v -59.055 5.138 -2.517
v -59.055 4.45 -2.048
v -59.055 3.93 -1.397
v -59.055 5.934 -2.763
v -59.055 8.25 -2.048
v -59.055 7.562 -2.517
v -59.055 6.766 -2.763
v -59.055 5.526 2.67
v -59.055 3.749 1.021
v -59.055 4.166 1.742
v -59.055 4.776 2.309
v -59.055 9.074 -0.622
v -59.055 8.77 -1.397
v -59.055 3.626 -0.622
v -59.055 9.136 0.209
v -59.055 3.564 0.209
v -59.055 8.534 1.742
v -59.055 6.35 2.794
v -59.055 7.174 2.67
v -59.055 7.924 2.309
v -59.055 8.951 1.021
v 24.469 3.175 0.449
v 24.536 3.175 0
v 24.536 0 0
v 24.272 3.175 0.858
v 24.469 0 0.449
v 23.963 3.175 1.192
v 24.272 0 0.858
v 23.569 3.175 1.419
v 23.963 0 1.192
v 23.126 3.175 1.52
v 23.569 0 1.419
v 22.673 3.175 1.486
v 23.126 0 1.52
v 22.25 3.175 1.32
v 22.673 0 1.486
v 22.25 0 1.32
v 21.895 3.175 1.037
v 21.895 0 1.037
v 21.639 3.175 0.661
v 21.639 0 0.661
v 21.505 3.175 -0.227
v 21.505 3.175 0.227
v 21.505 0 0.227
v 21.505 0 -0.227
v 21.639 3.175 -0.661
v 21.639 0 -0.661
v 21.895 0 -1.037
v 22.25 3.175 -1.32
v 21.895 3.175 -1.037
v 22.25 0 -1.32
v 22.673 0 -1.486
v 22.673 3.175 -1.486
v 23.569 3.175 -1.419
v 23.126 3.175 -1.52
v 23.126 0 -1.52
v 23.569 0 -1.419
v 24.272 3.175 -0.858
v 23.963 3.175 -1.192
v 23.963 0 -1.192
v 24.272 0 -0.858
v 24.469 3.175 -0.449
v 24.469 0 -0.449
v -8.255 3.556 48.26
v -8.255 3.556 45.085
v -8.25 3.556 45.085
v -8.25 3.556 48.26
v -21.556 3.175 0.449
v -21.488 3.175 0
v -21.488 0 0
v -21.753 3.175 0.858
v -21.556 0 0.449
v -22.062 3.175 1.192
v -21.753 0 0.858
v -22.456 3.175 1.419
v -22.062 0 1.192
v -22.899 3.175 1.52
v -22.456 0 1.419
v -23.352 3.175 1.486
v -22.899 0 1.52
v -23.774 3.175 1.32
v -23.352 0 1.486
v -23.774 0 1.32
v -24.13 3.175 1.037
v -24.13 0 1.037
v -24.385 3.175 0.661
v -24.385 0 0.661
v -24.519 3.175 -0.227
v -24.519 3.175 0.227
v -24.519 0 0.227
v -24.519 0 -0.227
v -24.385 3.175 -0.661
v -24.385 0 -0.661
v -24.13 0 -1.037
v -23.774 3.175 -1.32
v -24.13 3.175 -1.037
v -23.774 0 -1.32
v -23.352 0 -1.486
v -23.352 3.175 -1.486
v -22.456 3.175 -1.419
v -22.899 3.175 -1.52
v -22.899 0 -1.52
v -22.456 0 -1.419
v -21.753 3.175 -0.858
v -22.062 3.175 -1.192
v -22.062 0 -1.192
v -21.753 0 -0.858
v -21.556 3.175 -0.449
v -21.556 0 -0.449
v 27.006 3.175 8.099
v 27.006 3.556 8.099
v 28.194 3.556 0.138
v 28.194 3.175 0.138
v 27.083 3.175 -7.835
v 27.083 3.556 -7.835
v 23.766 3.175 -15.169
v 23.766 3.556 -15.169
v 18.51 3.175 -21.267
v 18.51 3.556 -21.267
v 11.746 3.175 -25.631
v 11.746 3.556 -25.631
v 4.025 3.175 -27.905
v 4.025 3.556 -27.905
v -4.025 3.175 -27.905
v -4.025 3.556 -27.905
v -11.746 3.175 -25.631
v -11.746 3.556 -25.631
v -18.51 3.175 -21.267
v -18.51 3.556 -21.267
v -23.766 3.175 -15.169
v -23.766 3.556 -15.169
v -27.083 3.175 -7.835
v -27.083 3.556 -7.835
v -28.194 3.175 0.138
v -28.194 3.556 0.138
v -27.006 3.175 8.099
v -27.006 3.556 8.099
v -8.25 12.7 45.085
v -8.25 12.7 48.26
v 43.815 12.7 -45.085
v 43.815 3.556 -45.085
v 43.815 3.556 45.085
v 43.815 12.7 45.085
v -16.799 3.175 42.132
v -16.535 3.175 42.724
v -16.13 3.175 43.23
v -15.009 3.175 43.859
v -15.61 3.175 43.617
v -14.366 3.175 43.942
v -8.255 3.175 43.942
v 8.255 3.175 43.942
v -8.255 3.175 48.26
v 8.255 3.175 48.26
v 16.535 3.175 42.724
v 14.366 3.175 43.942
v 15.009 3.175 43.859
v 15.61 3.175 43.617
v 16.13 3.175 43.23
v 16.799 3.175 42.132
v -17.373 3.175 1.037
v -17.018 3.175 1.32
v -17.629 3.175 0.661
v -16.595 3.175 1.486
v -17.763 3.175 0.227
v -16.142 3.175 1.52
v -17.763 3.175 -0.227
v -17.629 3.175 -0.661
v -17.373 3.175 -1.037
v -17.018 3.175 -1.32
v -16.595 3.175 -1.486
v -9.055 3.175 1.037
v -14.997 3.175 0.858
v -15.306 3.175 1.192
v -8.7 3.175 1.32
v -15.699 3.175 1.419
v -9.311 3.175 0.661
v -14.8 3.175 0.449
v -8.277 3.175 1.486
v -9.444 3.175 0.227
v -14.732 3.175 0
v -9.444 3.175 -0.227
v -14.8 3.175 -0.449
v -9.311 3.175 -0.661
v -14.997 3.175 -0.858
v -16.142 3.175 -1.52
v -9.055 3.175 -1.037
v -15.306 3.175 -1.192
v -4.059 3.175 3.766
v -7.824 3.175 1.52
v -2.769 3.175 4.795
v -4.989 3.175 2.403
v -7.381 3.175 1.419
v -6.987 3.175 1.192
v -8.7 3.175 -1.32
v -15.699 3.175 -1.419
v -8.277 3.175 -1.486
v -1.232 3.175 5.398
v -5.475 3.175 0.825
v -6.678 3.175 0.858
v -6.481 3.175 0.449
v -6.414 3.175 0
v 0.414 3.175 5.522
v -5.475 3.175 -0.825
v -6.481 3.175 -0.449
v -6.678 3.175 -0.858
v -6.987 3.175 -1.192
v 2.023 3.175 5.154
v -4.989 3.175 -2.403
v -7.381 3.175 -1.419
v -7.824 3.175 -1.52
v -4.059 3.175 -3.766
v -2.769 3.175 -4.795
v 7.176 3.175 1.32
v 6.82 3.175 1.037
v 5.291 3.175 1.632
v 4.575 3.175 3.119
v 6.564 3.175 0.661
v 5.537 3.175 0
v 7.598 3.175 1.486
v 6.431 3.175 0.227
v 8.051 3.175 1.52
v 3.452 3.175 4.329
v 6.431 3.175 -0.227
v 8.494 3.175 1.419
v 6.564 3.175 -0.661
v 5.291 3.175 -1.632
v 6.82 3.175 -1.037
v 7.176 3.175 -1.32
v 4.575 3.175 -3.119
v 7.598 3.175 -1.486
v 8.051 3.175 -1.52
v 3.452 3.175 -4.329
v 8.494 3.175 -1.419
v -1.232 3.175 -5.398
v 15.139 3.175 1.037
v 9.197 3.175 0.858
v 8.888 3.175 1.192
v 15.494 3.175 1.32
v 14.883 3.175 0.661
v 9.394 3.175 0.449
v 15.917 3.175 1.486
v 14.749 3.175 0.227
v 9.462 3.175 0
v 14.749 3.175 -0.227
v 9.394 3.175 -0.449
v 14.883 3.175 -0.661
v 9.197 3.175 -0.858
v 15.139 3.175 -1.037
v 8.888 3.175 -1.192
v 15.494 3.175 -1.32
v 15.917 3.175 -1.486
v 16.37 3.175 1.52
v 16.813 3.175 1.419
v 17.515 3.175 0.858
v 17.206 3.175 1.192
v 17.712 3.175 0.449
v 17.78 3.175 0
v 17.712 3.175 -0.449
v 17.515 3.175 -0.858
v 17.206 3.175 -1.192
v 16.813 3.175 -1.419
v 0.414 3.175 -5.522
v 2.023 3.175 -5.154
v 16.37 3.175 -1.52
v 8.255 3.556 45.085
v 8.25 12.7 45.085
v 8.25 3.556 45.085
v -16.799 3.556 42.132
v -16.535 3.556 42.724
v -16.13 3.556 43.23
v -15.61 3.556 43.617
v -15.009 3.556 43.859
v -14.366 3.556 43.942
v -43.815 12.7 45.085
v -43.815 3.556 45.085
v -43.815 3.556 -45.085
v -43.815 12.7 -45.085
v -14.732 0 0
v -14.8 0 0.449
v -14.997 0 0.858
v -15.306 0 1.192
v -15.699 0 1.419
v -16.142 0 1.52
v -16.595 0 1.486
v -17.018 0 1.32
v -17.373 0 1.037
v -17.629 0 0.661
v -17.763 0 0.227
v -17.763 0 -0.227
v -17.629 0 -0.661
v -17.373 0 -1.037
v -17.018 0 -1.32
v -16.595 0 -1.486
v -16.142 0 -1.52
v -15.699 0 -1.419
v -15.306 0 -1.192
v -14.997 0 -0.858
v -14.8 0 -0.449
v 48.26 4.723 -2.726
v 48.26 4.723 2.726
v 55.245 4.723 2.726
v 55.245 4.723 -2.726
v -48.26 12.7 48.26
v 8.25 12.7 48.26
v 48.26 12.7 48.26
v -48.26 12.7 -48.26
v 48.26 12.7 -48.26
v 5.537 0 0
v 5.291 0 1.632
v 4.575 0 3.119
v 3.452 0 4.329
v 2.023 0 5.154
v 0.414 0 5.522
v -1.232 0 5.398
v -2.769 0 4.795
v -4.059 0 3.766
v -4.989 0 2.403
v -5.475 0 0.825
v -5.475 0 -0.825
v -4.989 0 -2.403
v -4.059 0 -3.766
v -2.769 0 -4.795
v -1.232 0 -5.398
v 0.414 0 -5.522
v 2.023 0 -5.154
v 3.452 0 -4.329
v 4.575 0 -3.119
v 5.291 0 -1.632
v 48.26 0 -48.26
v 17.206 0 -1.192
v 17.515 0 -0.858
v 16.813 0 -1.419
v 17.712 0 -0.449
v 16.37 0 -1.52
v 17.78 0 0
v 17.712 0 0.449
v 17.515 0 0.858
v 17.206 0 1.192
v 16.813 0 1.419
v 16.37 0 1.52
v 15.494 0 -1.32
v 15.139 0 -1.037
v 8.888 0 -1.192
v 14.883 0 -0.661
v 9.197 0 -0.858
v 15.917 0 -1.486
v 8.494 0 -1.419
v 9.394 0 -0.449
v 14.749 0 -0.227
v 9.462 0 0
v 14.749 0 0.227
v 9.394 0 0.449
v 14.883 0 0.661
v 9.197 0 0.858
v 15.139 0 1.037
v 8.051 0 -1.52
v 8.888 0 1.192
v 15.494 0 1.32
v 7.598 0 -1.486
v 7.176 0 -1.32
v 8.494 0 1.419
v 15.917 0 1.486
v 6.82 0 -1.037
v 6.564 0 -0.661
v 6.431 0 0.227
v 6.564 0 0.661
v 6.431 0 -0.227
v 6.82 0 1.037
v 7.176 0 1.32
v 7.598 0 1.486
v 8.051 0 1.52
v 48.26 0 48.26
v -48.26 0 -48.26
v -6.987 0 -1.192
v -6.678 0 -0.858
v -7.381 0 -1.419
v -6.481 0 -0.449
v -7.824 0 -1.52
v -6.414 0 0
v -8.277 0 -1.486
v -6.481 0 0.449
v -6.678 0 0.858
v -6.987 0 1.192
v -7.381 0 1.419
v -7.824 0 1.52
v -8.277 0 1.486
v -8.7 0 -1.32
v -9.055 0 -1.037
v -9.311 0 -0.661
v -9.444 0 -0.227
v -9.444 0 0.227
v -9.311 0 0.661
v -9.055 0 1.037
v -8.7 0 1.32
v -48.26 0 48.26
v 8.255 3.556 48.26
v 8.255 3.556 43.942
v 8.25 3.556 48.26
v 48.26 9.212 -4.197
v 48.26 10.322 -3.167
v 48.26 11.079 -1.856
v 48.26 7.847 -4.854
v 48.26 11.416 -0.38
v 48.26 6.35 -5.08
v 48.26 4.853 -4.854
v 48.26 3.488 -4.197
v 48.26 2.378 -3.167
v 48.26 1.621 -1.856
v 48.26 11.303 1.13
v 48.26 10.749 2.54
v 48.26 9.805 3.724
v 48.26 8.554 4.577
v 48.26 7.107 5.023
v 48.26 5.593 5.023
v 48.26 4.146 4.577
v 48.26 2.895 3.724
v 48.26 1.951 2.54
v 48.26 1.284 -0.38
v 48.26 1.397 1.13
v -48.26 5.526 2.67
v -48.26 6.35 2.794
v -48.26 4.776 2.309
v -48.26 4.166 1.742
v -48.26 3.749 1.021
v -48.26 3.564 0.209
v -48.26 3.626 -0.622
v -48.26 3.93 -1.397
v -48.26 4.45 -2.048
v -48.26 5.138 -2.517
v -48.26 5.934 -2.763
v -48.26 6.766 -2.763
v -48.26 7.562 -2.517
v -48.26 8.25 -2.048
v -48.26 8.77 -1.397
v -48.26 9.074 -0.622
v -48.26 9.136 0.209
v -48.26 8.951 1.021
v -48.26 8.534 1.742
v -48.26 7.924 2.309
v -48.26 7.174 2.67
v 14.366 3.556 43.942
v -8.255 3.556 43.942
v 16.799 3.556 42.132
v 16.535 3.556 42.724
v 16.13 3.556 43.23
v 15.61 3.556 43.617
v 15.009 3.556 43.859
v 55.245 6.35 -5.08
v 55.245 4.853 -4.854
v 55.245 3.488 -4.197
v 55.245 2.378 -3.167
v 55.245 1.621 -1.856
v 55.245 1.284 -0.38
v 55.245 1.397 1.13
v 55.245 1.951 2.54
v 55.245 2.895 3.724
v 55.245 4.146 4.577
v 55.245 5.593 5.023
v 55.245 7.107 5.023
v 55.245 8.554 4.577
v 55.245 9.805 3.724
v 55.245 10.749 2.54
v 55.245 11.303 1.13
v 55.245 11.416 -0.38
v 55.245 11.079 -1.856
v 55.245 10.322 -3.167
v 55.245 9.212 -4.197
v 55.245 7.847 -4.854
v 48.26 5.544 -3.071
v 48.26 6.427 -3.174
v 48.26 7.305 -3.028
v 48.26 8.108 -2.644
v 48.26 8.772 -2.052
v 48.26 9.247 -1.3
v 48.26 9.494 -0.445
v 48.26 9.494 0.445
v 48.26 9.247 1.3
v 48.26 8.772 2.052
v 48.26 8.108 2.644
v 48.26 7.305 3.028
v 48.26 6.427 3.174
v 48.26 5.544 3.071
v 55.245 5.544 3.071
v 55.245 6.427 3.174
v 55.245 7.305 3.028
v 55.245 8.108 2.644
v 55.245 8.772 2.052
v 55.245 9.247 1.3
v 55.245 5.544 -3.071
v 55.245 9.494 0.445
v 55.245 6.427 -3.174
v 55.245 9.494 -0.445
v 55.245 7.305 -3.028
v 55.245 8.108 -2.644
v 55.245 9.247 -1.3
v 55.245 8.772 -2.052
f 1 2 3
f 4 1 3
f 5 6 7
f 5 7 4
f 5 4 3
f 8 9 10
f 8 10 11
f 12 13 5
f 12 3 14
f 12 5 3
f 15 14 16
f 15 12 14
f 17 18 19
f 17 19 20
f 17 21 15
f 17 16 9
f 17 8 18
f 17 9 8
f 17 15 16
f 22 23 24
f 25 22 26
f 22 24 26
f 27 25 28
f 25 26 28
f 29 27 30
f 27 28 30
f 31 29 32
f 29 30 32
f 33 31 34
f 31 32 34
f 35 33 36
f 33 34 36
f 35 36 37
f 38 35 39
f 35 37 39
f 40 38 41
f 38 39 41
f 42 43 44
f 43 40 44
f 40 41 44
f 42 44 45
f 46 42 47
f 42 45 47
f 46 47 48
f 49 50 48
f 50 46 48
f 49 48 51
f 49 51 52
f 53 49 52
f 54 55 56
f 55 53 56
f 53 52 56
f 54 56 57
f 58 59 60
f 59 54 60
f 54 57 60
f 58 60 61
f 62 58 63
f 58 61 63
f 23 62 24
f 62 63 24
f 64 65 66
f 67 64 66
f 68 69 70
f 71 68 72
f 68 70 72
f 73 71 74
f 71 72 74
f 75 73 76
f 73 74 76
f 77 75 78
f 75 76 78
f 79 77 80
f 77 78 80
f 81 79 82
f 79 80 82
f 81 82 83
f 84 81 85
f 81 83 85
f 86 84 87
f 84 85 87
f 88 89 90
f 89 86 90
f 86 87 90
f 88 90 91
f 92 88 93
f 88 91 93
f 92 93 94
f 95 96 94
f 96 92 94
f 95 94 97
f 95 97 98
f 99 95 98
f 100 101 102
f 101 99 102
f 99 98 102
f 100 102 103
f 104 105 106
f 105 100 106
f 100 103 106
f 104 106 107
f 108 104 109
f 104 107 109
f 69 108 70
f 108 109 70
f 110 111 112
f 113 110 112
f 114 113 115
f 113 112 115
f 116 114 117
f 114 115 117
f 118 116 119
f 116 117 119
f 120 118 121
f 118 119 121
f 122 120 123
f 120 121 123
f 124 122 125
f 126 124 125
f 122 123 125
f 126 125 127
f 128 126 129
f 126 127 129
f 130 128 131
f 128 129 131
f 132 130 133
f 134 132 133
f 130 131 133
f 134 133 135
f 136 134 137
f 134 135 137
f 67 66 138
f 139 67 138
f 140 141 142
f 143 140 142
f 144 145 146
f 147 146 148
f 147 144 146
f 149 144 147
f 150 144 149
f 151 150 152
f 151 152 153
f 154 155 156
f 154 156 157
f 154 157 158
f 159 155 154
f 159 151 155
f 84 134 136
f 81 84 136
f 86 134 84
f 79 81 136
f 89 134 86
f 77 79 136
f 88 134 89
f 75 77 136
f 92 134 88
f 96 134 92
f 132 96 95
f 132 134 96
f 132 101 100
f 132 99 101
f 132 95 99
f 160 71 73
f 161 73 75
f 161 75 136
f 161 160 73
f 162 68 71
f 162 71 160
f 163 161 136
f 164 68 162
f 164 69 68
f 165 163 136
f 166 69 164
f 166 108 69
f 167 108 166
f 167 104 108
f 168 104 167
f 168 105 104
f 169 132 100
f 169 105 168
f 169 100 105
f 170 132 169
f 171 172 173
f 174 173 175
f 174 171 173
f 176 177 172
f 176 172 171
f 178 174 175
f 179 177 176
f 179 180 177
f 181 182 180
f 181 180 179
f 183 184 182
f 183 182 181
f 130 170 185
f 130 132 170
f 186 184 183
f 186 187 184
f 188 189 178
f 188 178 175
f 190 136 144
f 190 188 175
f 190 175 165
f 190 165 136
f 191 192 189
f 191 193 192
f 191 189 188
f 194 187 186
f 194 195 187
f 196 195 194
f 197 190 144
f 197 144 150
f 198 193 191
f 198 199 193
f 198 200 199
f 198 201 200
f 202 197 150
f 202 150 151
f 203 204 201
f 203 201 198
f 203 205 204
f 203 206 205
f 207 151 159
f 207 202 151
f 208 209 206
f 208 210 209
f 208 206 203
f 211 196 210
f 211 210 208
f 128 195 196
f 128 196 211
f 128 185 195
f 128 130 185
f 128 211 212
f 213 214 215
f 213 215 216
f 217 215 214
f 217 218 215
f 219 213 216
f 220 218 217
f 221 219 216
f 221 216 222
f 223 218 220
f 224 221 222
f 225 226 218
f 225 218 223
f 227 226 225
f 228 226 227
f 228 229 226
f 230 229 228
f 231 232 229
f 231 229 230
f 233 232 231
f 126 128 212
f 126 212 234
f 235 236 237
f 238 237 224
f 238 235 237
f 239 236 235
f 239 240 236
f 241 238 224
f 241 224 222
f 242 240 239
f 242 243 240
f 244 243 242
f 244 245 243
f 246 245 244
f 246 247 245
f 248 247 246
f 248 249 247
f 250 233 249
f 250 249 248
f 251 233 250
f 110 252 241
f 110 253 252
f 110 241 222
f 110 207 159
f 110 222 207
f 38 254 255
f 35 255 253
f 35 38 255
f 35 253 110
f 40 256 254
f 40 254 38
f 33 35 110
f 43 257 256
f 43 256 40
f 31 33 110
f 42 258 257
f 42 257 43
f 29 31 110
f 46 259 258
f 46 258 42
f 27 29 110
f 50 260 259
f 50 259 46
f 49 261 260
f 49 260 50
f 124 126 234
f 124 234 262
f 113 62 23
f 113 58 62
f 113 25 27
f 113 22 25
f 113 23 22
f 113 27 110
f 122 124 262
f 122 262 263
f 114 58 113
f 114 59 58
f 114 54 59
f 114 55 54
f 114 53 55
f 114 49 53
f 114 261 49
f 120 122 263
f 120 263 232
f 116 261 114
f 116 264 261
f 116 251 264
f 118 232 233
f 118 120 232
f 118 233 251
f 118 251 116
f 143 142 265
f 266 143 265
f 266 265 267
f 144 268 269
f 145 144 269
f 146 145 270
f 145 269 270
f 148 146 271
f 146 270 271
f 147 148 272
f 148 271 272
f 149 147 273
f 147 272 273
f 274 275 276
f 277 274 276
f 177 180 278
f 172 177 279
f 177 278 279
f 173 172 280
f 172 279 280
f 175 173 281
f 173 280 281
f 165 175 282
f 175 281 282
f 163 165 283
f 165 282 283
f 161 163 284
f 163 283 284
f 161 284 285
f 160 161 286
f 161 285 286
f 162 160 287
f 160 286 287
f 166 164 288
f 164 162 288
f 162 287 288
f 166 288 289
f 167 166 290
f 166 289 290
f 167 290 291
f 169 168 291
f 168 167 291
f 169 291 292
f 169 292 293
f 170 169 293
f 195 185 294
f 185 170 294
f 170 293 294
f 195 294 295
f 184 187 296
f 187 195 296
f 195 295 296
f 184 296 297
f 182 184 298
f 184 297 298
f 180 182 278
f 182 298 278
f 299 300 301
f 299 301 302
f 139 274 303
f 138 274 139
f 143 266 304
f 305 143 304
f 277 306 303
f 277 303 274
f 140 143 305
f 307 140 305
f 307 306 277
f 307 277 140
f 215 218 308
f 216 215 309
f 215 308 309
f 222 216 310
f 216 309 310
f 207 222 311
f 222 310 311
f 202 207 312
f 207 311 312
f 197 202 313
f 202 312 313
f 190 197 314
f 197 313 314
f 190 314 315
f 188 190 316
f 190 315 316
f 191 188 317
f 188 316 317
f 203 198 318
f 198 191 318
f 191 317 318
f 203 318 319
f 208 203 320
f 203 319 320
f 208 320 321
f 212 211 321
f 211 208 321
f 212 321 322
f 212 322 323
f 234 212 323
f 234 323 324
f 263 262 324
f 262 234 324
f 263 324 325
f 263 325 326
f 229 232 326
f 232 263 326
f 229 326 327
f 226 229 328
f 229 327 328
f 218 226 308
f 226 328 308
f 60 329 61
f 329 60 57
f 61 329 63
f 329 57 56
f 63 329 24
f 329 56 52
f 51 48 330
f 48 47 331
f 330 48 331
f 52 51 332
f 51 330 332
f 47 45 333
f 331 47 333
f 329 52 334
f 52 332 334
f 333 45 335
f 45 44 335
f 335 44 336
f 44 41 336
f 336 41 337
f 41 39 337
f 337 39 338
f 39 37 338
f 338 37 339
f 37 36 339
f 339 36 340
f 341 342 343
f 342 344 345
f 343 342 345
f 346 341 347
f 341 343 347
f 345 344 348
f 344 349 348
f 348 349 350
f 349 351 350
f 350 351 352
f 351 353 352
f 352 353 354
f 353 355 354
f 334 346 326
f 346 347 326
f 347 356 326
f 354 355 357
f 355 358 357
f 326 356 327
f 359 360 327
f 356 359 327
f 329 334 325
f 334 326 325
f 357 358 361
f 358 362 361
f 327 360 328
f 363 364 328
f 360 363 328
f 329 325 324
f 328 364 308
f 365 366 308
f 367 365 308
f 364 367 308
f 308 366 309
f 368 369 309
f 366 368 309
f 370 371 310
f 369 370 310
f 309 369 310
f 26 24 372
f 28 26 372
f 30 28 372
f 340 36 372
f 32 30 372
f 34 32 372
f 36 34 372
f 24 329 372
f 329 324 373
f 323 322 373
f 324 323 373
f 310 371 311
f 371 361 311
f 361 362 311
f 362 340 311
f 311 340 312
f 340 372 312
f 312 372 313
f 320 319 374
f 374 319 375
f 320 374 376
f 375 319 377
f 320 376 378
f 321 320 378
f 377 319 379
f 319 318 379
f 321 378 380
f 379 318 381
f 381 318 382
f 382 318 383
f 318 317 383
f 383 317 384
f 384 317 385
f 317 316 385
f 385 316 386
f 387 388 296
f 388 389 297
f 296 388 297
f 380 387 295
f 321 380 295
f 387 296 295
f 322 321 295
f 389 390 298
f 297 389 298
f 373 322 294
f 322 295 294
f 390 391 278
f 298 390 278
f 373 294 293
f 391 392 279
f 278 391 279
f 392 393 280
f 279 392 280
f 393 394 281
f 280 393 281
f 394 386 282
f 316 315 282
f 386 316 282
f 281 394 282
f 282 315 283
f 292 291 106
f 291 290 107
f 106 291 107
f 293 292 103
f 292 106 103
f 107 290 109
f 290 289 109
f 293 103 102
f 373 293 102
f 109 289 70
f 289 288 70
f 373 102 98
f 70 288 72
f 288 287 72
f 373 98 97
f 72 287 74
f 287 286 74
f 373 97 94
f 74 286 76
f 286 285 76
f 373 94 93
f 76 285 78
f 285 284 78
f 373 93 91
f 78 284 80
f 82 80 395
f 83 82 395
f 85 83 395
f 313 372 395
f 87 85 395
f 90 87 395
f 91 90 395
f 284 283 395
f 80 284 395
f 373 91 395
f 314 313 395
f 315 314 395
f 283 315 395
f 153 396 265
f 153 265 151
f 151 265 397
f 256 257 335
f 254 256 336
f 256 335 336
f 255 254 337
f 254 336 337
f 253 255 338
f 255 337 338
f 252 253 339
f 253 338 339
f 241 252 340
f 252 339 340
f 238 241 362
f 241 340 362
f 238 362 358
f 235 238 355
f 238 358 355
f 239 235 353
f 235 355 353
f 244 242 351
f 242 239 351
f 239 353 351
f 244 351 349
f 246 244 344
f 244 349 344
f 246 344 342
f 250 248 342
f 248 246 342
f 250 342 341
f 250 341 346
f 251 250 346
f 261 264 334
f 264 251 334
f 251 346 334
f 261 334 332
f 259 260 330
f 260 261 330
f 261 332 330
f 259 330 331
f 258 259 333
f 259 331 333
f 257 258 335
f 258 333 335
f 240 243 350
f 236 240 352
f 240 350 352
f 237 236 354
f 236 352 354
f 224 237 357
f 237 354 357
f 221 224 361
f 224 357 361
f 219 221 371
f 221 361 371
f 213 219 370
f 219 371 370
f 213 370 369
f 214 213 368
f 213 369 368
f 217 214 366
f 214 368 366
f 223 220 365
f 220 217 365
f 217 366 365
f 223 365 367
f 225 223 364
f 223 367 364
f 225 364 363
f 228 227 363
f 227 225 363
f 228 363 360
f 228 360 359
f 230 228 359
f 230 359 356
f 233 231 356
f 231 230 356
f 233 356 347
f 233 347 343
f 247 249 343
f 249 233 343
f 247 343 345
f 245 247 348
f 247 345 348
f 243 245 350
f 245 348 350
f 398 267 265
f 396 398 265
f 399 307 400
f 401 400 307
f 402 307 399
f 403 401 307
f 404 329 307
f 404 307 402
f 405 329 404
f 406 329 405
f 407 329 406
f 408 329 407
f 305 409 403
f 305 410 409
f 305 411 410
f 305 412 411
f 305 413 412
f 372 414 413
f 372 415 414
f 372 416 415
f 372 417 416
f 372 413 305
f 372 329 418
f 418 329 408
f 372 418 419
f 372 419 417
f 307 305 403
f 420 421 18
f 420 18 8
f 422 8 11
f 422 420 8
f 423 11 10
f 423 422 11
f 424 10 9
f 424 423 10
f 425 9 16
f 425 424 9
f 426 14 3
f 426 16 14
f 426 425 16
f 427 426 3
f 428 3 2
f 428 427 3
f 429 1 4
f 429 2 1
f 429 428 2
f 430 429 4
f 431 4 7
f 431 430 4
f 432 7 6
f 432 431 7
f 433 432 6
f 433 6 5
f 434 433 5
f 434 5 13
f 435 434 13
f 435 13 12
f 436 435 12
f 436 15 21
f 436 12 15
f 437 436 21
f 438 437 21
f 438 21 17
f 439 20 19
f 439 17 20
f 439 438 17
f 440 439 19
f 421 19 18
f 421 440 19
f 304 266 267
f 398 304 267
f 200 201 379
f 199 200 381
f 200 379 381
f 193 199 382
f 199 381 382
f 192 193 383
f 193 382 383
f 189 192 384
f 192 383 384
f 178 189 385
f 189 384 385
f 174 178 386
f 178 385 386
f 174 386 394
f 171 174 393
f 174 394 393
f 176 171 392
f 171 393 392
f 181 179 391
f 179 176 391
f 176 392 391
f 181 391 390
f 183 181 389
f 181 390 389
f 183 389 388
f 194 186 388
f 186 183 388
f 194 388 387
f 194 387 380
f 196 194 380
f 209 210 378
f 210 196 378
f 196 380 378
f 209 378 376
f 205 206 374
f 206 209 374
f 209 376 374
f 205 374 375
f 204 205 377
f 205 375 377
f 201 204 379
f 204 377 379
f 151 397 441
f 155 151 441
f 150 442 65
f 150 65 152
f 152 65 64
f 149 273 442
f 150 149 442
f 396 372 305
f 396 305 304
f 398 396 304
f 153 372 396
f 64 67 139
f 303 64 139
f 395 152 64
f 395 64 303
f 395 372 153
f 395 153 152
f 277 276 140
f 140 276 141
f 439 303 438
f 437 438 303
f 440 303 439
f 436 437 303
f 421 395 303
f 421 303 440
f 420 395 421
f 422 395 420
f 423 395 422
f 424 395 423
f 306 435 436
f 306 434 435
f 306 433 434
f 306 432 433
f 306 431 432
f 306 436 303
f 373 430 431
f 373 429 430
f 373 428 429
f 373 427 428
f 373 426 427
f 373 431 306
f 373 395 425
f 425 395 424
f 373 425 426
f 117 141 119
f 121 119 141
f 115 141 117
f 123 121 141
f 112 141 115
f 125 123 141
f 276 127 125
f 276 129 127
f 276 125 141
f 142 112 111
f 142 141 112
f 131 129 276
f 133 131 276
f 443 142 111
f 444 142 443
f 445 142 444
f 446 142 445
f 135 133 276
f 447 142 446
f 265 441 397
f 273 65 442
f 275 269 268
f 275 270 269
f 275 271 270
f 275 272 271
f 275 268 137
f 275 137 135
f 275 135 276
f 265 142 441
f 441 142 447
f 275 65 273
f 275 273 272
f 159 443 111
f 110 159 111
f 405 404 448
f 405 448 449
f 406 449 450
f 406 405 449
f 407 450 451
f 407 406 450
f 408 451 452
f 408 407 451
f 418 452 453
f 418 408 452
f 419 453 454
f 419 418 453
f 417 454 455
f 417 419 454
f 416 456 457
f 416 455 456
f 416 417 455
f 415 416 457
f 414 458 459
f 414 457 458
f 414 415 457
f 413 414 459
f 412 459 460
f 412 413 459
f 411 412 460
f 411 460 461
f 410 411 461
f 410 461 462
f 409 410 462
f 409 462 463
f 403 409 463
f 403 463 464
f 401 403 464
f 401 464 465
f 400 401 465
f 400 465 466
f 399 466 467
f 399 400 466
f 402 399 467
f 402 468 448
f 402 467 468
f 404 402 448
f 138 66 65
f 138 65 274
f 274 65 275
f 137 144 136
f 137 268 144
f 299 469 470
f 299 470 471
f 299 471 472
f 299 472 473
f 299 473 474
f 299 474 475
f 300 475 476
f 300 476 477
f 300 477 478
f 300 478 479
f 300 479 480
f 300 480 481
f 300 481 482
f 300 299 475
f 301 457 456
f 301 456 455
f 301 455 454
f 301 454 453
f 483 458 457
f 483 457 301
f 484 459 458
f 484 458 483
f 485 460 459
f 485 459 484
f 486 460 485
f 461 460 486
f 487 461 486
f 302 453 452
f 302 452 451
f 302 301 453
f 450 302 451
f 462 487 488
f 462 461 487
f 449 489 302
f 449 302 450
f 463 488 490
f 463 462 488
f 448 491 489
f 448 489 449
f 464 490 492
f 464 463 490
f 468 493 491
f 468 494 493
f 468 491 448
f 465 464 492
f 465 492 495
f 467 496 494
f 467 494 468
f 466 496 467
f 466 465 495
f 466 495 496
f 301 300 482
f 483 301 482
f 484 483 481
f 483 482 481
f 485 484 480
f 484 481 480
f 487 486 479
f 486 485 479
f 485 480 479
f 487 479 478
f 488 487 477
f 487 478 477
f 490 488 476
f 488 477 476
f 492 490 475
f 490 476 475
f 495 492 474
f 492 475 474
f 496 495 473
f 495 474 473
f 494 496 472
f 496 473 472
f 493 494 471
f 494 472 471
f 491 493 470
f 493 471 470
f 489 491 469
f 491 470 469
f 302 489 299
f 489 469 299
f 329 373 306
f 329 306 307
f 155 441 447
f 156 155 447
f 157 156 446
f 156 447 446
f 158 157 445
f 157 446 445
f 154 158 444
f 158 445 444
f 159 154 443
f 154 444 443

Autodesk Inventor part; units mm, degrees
ref_plane "YZ Plane" through (0, 0, 0) normal (1, 0, 0) x (0, 1, 0)
ref_plane "XZ Plane" through (0, 0, 0) normal (0, 1, 0) x (-1, 0, 0)
ref_plane "XY Plane" through (0, 0, 0) normal (0, 0, 1) x (1, 0, 0)
sketch "Sketch1" plane through (0, 0, 0) normal (0, 1, 0) x (-1, 0, 0)
  line L0 (0, 0) -> (0, 0) construction
  line L1 (-48.26, 48.26) -> (48.26, 48.26)
  line L2 (48.26, 48.26) -> (48.26, -48.26)
  line L3 (48.26, -48.26) -> (-48.26, -48.26)
  line L4 (-48.26, -48.26) -> (-48.26, 48.26)
  line L5 (-48.26, 48.26) -> (48.26, -48.26) construction
  line L6 (48.26, 48.26) -> (-48.26, -48.26) construction
  dimension "d15" = 0
  dimension "d16" = 96.52
extrude "Extrusion2" add sketch "Sketch1" along normal blind 3.556
sketch "Sketch7" plane through (0, 3.556, 0) normal (0, 1, 0) x (1, 0, 0)
  arc A0 (27.0056, -8.0993) -> (-27.0056, -8.0993) centre (0, 0) ccw
  line L0 (0, -43.942) -> (14.366, -43.942)
  line L1 (-14.366, -43.942) -> (0, -43.942)
  line L2 (0, 15.1299) -> (0, -95.843) construction
  line L3 (33.8234, 0) -> (-34.0336, 0) construction
  line L4 (16.256, 0) -> (16.256, -43.942) construction
  line L5 (16.7989, -42.1317) -> (27.0056, -8.0993)
  line L6 (-16.7989, -42.1317) -> (-27.0056, -8.0993)
  circle A1 centre (0, 0) radius 5.5372
  arc A2 (14.366, -43.942) -> (16.7989, -42.1317) centre (14.366, -41.402) ccw
  arc A3 (-16.7989, -42.1317) -> (-14.366, -43.942) centre (-14.366, -41.402) ccw
  circle A4 centre (7.9375, 0) radius 1.524
  line L7 (0, 0) -> (7.9375, 0) construction
  circle A5 centre (-7.9375, 0) radius 1.524
  line L8 (0, 0) -> (-7.9375, 0) construction
  circle A6 centre (16.256, 0) radius 1.524
  line L9 (0, 0) -> (16.256, 0) construction
  circle A7 centre (-16.256, 0) radius 1.524
  line L10 (0, 0) -> (-16.256, 0) construction
  circle A8 centre (23.0124, 0) radius 1.524
  line L11 (0, 0) -> (23.0124, 0) construction
  circle A9 centre (-23.0124, 0) radius 1.524
  line L12 (0, 0) -> (-23.0124, 0) construction
  line L13 (-48.26, -48.26) -> (48.26, -48.26) projected
  line L14 (8.255, -39.624) -> (-8.255, -39.624)
  line L15 (-8.255, -39.624) -> (-8.255, -48.26)
  line L16 (-8.255, -48.26) -> (8.255, -48.26)
  line L17 (8.255, -48.26) -> (8.255, -39.624)
  line L18 (8.255, -39.624) -> (-8.255, -48.26) construction
  line L19 (-8.255, -39.624) -> (8.255, -48.26) construction
  point P0 (-16.256, -43.942)
  dimension "d43" = 56.388
  dimension "d44" = 16.256
  dimension "d45" = 16.256
  dimension "d46" = 43.942
  dimension "d47" = 11.0744
  dimension "d48" = 2.54
  dimension "d49" = 3.048
  dimension "d50" = 7.9375
  dimension "d51" = 3.048
  dimension "d52" = 16.256
  dimension "d53" = 3.048
  dimension "d54" = 23.0124
  dimension "d77" = 16.51
extrude "Extrusion3" cut sketch "Sketch7" against normal blind 0.381
sketch "Sketch8" plane through (0, 0, 0) normal (0, -1, 0) x (1, 0, 0)
  arc A0 (27.0056, -8.0993) -> (-27.0056, -8.0993) centre (0, 0) ccw
  line L0 (0, -43.942) -> (14.366, -43.942)
  line L1 (-14.366, -43.942) -> (0, -43.942)
  line L2 (0, 15.1299) -> (0, -95.843) construction
  line L3 (33.8234, 0) -> (-34.0336, 0) construction
  line L4 (16.256, 0) -> (16.256, -43.942) construction
  line L5 (16.7989, -42.1317) -> (27.0056, -8.0993)
  line L6 (-16.7989, -42.1317) -> (-27.0056, -8.0993)
  circle A1 centre (0, 0) radius 5.5372
  arc A2 (14.366, -43.942) -> (16.7989, -42.1317) centre (14.366, -41.402) ccw
  arc A3 (-16.7989, -42.1317) -> (-14.366, -43.942) centre (-14.366, -41.402) ccw
  circle A4 centre (7.9375, 0) radius 1.524
  line L7 (0, 0) -> (7.9375, 0) construction
  circle A5 centre (-7.9375, 0) radius 1.524
  line L8 (0, 0) -> (-7.9375, 0) construction
  circle A6 centre (16.256, 0) radius 1.524
  line L9 (0, 0) -> (16.256, 0) construction
  circle A7 centre (-16.256, 0) radius 1.524
  line L10 (0, 0) -> (-16.256, 0) construction
  circle A8 centre (23.0124, 0) radius 1.524
  line L11 (0, 0) -> (23.0124, 0) construction
  circle A9 centre (-23.0124, 0) radius 1.524
  line L12 (0, 0) -> (-23.0124, 0) construction
  point P0 (-16.256, -43.942)
  dimension "d57" = 56.388
  dimension "d58" = 16.256
  dimension "d59" = 16.256
  dimension "d60" = 43.942
  dimension "d61" = 11.0744
  dimension "d62" = 2.54
  dimension "d63" = 3.048
  dimension "d64" = 7.9375
  dimension "d65" = 3.048
  dimension "d66" = 16.256
  dimension "d67" = 3.048
  dimension "d68" = 23.0124
extrude "Extrusion4" cut sketch "Sketch8" against normal blind 3.556 contours A1 | A4 | A5 | A6 | A7 | A8 | A9
sketch "Sketch9" plane through (0, 3.556, 0) normal (0, 1, 0) x (1, 0, 0)
  line L0 (43.815, -45.085) -> (-43.815, -45.085)
  line L1 (-43.815, -45.085) -> (-43.815, 45.085)
  line L2 (-43.815, 45.085) -> (43.815, 45.085)
  line L3 (43.815, 45.085) -> (43.815, -45.085)
  line L4 (43.815, -45.085) -> (-43.815, 45.085) construction
  line L5 (-43.815, -45.085) -> (43.815, 45.085) construction
  line L6 (48.26, -48.26) -> (-48.26, -48.26)
  line L7 (-48.26, -48.26) -> (-48.26, 48.26)
  line L8 (-48.26, 48.26) -> (48.26, 48.26)
  line L9 (48.26, 48.26) -> (48.26, -48.26)
  line L10 (48.26, -48.26) -> (-48.26, 48.26) construction
  line L11 (-48.26, -48.26) -> (48.26, 48.26) construction
  point P0 (0, 0)
  dimension "d71" = 90.17
  dimension "d72" = 87.63
extrude "Extrusion5" add sketch "Sketch9" along normal blind 9.144
sketch "Sketch10" plane through (43.815, 3.556, 45.085) normal (0, 0, -1) x (-1, 0, 0)
  line L0 (0, 9.144) -> (87.63, 9.144) projected
  line L1 (35.5652, 0) -> (52.0648, 0)
  line L2 (52.0648, 0) -> (52.0648, 9.144)
  line L3 (52.0648, 9.144) -> (35.5652, 9.144)
  line L4 (35.5652, 9.144) -> (35.5652, 0)
  line L5 (35.5652, 0) -> (52.0648, 9.144) construction
  line L6 (52.0648, 0) -> (35.5652, 9.144) construction
  line L7 (43.815, 4.572) -> (87.63, 4.572) construction
  line L8 (43.815, 4.572) -> (0, 4.572) construction
  line L9 (0, 0) -> (0, 9.144) construction
  point P0 (43.815, -3.556)
  dimension "d88" = 28.995
  dimension "d89" = 52.0648
extrude "Extrusion6" cut sketch "Sketch10" against normal up to next
sketch "Sketch14" plane through (-48.26, 0, -48.26) normal (-1, 0, 0) x (0, 0, 1)
  circle A0 centre (48.26, 6.35) radius 2.794
  line L0 (48.26, 6.35) -> (96.52, 6.35) construction
  line L1 (48.26, 6.35) -> (0, 6.35) construction
  line L2 (0, 0) -> (0, 12.7) construction
  point P0 (48.26, 0)
  dimension "d78" = 5.588
  dimension "d90" = 96.52
extrude "Extrusion7" add sketch "Sketch14" along normal blind 10.795
sketch "Sketch15" plane through (48.26, 0, 48.26) normal (1, 0, 0) x (0, 0, -1)
  arc A0 (50.9865, 4.7231) -> (45.5335, 4.7231) centre (48.26, 6.35) ccw
  circle A1 centre (48.26, 6.35) radius 5.08
  line L0 (45.5335, 4.7231) -> (50.9865, 4.7231)
  line L1 (48.26, 6.35) -> (0, 6.35) construction
  line L2 (0, 0) -> (0, 12.7) construction
  line L3 (48.26, 6.35) -> (96.52, 6.35) construction
  line L4 (96.52, 0) -> (96.52, 12.7) construction
  dimension "d81" = 6.35
  dimension "d82" = 10.16
  dimension "d91" = 1.6269
extrude "Extrusion9" add sketch "Sketch15" along normal blind 6.985
properties part number "joystick_inner1"
